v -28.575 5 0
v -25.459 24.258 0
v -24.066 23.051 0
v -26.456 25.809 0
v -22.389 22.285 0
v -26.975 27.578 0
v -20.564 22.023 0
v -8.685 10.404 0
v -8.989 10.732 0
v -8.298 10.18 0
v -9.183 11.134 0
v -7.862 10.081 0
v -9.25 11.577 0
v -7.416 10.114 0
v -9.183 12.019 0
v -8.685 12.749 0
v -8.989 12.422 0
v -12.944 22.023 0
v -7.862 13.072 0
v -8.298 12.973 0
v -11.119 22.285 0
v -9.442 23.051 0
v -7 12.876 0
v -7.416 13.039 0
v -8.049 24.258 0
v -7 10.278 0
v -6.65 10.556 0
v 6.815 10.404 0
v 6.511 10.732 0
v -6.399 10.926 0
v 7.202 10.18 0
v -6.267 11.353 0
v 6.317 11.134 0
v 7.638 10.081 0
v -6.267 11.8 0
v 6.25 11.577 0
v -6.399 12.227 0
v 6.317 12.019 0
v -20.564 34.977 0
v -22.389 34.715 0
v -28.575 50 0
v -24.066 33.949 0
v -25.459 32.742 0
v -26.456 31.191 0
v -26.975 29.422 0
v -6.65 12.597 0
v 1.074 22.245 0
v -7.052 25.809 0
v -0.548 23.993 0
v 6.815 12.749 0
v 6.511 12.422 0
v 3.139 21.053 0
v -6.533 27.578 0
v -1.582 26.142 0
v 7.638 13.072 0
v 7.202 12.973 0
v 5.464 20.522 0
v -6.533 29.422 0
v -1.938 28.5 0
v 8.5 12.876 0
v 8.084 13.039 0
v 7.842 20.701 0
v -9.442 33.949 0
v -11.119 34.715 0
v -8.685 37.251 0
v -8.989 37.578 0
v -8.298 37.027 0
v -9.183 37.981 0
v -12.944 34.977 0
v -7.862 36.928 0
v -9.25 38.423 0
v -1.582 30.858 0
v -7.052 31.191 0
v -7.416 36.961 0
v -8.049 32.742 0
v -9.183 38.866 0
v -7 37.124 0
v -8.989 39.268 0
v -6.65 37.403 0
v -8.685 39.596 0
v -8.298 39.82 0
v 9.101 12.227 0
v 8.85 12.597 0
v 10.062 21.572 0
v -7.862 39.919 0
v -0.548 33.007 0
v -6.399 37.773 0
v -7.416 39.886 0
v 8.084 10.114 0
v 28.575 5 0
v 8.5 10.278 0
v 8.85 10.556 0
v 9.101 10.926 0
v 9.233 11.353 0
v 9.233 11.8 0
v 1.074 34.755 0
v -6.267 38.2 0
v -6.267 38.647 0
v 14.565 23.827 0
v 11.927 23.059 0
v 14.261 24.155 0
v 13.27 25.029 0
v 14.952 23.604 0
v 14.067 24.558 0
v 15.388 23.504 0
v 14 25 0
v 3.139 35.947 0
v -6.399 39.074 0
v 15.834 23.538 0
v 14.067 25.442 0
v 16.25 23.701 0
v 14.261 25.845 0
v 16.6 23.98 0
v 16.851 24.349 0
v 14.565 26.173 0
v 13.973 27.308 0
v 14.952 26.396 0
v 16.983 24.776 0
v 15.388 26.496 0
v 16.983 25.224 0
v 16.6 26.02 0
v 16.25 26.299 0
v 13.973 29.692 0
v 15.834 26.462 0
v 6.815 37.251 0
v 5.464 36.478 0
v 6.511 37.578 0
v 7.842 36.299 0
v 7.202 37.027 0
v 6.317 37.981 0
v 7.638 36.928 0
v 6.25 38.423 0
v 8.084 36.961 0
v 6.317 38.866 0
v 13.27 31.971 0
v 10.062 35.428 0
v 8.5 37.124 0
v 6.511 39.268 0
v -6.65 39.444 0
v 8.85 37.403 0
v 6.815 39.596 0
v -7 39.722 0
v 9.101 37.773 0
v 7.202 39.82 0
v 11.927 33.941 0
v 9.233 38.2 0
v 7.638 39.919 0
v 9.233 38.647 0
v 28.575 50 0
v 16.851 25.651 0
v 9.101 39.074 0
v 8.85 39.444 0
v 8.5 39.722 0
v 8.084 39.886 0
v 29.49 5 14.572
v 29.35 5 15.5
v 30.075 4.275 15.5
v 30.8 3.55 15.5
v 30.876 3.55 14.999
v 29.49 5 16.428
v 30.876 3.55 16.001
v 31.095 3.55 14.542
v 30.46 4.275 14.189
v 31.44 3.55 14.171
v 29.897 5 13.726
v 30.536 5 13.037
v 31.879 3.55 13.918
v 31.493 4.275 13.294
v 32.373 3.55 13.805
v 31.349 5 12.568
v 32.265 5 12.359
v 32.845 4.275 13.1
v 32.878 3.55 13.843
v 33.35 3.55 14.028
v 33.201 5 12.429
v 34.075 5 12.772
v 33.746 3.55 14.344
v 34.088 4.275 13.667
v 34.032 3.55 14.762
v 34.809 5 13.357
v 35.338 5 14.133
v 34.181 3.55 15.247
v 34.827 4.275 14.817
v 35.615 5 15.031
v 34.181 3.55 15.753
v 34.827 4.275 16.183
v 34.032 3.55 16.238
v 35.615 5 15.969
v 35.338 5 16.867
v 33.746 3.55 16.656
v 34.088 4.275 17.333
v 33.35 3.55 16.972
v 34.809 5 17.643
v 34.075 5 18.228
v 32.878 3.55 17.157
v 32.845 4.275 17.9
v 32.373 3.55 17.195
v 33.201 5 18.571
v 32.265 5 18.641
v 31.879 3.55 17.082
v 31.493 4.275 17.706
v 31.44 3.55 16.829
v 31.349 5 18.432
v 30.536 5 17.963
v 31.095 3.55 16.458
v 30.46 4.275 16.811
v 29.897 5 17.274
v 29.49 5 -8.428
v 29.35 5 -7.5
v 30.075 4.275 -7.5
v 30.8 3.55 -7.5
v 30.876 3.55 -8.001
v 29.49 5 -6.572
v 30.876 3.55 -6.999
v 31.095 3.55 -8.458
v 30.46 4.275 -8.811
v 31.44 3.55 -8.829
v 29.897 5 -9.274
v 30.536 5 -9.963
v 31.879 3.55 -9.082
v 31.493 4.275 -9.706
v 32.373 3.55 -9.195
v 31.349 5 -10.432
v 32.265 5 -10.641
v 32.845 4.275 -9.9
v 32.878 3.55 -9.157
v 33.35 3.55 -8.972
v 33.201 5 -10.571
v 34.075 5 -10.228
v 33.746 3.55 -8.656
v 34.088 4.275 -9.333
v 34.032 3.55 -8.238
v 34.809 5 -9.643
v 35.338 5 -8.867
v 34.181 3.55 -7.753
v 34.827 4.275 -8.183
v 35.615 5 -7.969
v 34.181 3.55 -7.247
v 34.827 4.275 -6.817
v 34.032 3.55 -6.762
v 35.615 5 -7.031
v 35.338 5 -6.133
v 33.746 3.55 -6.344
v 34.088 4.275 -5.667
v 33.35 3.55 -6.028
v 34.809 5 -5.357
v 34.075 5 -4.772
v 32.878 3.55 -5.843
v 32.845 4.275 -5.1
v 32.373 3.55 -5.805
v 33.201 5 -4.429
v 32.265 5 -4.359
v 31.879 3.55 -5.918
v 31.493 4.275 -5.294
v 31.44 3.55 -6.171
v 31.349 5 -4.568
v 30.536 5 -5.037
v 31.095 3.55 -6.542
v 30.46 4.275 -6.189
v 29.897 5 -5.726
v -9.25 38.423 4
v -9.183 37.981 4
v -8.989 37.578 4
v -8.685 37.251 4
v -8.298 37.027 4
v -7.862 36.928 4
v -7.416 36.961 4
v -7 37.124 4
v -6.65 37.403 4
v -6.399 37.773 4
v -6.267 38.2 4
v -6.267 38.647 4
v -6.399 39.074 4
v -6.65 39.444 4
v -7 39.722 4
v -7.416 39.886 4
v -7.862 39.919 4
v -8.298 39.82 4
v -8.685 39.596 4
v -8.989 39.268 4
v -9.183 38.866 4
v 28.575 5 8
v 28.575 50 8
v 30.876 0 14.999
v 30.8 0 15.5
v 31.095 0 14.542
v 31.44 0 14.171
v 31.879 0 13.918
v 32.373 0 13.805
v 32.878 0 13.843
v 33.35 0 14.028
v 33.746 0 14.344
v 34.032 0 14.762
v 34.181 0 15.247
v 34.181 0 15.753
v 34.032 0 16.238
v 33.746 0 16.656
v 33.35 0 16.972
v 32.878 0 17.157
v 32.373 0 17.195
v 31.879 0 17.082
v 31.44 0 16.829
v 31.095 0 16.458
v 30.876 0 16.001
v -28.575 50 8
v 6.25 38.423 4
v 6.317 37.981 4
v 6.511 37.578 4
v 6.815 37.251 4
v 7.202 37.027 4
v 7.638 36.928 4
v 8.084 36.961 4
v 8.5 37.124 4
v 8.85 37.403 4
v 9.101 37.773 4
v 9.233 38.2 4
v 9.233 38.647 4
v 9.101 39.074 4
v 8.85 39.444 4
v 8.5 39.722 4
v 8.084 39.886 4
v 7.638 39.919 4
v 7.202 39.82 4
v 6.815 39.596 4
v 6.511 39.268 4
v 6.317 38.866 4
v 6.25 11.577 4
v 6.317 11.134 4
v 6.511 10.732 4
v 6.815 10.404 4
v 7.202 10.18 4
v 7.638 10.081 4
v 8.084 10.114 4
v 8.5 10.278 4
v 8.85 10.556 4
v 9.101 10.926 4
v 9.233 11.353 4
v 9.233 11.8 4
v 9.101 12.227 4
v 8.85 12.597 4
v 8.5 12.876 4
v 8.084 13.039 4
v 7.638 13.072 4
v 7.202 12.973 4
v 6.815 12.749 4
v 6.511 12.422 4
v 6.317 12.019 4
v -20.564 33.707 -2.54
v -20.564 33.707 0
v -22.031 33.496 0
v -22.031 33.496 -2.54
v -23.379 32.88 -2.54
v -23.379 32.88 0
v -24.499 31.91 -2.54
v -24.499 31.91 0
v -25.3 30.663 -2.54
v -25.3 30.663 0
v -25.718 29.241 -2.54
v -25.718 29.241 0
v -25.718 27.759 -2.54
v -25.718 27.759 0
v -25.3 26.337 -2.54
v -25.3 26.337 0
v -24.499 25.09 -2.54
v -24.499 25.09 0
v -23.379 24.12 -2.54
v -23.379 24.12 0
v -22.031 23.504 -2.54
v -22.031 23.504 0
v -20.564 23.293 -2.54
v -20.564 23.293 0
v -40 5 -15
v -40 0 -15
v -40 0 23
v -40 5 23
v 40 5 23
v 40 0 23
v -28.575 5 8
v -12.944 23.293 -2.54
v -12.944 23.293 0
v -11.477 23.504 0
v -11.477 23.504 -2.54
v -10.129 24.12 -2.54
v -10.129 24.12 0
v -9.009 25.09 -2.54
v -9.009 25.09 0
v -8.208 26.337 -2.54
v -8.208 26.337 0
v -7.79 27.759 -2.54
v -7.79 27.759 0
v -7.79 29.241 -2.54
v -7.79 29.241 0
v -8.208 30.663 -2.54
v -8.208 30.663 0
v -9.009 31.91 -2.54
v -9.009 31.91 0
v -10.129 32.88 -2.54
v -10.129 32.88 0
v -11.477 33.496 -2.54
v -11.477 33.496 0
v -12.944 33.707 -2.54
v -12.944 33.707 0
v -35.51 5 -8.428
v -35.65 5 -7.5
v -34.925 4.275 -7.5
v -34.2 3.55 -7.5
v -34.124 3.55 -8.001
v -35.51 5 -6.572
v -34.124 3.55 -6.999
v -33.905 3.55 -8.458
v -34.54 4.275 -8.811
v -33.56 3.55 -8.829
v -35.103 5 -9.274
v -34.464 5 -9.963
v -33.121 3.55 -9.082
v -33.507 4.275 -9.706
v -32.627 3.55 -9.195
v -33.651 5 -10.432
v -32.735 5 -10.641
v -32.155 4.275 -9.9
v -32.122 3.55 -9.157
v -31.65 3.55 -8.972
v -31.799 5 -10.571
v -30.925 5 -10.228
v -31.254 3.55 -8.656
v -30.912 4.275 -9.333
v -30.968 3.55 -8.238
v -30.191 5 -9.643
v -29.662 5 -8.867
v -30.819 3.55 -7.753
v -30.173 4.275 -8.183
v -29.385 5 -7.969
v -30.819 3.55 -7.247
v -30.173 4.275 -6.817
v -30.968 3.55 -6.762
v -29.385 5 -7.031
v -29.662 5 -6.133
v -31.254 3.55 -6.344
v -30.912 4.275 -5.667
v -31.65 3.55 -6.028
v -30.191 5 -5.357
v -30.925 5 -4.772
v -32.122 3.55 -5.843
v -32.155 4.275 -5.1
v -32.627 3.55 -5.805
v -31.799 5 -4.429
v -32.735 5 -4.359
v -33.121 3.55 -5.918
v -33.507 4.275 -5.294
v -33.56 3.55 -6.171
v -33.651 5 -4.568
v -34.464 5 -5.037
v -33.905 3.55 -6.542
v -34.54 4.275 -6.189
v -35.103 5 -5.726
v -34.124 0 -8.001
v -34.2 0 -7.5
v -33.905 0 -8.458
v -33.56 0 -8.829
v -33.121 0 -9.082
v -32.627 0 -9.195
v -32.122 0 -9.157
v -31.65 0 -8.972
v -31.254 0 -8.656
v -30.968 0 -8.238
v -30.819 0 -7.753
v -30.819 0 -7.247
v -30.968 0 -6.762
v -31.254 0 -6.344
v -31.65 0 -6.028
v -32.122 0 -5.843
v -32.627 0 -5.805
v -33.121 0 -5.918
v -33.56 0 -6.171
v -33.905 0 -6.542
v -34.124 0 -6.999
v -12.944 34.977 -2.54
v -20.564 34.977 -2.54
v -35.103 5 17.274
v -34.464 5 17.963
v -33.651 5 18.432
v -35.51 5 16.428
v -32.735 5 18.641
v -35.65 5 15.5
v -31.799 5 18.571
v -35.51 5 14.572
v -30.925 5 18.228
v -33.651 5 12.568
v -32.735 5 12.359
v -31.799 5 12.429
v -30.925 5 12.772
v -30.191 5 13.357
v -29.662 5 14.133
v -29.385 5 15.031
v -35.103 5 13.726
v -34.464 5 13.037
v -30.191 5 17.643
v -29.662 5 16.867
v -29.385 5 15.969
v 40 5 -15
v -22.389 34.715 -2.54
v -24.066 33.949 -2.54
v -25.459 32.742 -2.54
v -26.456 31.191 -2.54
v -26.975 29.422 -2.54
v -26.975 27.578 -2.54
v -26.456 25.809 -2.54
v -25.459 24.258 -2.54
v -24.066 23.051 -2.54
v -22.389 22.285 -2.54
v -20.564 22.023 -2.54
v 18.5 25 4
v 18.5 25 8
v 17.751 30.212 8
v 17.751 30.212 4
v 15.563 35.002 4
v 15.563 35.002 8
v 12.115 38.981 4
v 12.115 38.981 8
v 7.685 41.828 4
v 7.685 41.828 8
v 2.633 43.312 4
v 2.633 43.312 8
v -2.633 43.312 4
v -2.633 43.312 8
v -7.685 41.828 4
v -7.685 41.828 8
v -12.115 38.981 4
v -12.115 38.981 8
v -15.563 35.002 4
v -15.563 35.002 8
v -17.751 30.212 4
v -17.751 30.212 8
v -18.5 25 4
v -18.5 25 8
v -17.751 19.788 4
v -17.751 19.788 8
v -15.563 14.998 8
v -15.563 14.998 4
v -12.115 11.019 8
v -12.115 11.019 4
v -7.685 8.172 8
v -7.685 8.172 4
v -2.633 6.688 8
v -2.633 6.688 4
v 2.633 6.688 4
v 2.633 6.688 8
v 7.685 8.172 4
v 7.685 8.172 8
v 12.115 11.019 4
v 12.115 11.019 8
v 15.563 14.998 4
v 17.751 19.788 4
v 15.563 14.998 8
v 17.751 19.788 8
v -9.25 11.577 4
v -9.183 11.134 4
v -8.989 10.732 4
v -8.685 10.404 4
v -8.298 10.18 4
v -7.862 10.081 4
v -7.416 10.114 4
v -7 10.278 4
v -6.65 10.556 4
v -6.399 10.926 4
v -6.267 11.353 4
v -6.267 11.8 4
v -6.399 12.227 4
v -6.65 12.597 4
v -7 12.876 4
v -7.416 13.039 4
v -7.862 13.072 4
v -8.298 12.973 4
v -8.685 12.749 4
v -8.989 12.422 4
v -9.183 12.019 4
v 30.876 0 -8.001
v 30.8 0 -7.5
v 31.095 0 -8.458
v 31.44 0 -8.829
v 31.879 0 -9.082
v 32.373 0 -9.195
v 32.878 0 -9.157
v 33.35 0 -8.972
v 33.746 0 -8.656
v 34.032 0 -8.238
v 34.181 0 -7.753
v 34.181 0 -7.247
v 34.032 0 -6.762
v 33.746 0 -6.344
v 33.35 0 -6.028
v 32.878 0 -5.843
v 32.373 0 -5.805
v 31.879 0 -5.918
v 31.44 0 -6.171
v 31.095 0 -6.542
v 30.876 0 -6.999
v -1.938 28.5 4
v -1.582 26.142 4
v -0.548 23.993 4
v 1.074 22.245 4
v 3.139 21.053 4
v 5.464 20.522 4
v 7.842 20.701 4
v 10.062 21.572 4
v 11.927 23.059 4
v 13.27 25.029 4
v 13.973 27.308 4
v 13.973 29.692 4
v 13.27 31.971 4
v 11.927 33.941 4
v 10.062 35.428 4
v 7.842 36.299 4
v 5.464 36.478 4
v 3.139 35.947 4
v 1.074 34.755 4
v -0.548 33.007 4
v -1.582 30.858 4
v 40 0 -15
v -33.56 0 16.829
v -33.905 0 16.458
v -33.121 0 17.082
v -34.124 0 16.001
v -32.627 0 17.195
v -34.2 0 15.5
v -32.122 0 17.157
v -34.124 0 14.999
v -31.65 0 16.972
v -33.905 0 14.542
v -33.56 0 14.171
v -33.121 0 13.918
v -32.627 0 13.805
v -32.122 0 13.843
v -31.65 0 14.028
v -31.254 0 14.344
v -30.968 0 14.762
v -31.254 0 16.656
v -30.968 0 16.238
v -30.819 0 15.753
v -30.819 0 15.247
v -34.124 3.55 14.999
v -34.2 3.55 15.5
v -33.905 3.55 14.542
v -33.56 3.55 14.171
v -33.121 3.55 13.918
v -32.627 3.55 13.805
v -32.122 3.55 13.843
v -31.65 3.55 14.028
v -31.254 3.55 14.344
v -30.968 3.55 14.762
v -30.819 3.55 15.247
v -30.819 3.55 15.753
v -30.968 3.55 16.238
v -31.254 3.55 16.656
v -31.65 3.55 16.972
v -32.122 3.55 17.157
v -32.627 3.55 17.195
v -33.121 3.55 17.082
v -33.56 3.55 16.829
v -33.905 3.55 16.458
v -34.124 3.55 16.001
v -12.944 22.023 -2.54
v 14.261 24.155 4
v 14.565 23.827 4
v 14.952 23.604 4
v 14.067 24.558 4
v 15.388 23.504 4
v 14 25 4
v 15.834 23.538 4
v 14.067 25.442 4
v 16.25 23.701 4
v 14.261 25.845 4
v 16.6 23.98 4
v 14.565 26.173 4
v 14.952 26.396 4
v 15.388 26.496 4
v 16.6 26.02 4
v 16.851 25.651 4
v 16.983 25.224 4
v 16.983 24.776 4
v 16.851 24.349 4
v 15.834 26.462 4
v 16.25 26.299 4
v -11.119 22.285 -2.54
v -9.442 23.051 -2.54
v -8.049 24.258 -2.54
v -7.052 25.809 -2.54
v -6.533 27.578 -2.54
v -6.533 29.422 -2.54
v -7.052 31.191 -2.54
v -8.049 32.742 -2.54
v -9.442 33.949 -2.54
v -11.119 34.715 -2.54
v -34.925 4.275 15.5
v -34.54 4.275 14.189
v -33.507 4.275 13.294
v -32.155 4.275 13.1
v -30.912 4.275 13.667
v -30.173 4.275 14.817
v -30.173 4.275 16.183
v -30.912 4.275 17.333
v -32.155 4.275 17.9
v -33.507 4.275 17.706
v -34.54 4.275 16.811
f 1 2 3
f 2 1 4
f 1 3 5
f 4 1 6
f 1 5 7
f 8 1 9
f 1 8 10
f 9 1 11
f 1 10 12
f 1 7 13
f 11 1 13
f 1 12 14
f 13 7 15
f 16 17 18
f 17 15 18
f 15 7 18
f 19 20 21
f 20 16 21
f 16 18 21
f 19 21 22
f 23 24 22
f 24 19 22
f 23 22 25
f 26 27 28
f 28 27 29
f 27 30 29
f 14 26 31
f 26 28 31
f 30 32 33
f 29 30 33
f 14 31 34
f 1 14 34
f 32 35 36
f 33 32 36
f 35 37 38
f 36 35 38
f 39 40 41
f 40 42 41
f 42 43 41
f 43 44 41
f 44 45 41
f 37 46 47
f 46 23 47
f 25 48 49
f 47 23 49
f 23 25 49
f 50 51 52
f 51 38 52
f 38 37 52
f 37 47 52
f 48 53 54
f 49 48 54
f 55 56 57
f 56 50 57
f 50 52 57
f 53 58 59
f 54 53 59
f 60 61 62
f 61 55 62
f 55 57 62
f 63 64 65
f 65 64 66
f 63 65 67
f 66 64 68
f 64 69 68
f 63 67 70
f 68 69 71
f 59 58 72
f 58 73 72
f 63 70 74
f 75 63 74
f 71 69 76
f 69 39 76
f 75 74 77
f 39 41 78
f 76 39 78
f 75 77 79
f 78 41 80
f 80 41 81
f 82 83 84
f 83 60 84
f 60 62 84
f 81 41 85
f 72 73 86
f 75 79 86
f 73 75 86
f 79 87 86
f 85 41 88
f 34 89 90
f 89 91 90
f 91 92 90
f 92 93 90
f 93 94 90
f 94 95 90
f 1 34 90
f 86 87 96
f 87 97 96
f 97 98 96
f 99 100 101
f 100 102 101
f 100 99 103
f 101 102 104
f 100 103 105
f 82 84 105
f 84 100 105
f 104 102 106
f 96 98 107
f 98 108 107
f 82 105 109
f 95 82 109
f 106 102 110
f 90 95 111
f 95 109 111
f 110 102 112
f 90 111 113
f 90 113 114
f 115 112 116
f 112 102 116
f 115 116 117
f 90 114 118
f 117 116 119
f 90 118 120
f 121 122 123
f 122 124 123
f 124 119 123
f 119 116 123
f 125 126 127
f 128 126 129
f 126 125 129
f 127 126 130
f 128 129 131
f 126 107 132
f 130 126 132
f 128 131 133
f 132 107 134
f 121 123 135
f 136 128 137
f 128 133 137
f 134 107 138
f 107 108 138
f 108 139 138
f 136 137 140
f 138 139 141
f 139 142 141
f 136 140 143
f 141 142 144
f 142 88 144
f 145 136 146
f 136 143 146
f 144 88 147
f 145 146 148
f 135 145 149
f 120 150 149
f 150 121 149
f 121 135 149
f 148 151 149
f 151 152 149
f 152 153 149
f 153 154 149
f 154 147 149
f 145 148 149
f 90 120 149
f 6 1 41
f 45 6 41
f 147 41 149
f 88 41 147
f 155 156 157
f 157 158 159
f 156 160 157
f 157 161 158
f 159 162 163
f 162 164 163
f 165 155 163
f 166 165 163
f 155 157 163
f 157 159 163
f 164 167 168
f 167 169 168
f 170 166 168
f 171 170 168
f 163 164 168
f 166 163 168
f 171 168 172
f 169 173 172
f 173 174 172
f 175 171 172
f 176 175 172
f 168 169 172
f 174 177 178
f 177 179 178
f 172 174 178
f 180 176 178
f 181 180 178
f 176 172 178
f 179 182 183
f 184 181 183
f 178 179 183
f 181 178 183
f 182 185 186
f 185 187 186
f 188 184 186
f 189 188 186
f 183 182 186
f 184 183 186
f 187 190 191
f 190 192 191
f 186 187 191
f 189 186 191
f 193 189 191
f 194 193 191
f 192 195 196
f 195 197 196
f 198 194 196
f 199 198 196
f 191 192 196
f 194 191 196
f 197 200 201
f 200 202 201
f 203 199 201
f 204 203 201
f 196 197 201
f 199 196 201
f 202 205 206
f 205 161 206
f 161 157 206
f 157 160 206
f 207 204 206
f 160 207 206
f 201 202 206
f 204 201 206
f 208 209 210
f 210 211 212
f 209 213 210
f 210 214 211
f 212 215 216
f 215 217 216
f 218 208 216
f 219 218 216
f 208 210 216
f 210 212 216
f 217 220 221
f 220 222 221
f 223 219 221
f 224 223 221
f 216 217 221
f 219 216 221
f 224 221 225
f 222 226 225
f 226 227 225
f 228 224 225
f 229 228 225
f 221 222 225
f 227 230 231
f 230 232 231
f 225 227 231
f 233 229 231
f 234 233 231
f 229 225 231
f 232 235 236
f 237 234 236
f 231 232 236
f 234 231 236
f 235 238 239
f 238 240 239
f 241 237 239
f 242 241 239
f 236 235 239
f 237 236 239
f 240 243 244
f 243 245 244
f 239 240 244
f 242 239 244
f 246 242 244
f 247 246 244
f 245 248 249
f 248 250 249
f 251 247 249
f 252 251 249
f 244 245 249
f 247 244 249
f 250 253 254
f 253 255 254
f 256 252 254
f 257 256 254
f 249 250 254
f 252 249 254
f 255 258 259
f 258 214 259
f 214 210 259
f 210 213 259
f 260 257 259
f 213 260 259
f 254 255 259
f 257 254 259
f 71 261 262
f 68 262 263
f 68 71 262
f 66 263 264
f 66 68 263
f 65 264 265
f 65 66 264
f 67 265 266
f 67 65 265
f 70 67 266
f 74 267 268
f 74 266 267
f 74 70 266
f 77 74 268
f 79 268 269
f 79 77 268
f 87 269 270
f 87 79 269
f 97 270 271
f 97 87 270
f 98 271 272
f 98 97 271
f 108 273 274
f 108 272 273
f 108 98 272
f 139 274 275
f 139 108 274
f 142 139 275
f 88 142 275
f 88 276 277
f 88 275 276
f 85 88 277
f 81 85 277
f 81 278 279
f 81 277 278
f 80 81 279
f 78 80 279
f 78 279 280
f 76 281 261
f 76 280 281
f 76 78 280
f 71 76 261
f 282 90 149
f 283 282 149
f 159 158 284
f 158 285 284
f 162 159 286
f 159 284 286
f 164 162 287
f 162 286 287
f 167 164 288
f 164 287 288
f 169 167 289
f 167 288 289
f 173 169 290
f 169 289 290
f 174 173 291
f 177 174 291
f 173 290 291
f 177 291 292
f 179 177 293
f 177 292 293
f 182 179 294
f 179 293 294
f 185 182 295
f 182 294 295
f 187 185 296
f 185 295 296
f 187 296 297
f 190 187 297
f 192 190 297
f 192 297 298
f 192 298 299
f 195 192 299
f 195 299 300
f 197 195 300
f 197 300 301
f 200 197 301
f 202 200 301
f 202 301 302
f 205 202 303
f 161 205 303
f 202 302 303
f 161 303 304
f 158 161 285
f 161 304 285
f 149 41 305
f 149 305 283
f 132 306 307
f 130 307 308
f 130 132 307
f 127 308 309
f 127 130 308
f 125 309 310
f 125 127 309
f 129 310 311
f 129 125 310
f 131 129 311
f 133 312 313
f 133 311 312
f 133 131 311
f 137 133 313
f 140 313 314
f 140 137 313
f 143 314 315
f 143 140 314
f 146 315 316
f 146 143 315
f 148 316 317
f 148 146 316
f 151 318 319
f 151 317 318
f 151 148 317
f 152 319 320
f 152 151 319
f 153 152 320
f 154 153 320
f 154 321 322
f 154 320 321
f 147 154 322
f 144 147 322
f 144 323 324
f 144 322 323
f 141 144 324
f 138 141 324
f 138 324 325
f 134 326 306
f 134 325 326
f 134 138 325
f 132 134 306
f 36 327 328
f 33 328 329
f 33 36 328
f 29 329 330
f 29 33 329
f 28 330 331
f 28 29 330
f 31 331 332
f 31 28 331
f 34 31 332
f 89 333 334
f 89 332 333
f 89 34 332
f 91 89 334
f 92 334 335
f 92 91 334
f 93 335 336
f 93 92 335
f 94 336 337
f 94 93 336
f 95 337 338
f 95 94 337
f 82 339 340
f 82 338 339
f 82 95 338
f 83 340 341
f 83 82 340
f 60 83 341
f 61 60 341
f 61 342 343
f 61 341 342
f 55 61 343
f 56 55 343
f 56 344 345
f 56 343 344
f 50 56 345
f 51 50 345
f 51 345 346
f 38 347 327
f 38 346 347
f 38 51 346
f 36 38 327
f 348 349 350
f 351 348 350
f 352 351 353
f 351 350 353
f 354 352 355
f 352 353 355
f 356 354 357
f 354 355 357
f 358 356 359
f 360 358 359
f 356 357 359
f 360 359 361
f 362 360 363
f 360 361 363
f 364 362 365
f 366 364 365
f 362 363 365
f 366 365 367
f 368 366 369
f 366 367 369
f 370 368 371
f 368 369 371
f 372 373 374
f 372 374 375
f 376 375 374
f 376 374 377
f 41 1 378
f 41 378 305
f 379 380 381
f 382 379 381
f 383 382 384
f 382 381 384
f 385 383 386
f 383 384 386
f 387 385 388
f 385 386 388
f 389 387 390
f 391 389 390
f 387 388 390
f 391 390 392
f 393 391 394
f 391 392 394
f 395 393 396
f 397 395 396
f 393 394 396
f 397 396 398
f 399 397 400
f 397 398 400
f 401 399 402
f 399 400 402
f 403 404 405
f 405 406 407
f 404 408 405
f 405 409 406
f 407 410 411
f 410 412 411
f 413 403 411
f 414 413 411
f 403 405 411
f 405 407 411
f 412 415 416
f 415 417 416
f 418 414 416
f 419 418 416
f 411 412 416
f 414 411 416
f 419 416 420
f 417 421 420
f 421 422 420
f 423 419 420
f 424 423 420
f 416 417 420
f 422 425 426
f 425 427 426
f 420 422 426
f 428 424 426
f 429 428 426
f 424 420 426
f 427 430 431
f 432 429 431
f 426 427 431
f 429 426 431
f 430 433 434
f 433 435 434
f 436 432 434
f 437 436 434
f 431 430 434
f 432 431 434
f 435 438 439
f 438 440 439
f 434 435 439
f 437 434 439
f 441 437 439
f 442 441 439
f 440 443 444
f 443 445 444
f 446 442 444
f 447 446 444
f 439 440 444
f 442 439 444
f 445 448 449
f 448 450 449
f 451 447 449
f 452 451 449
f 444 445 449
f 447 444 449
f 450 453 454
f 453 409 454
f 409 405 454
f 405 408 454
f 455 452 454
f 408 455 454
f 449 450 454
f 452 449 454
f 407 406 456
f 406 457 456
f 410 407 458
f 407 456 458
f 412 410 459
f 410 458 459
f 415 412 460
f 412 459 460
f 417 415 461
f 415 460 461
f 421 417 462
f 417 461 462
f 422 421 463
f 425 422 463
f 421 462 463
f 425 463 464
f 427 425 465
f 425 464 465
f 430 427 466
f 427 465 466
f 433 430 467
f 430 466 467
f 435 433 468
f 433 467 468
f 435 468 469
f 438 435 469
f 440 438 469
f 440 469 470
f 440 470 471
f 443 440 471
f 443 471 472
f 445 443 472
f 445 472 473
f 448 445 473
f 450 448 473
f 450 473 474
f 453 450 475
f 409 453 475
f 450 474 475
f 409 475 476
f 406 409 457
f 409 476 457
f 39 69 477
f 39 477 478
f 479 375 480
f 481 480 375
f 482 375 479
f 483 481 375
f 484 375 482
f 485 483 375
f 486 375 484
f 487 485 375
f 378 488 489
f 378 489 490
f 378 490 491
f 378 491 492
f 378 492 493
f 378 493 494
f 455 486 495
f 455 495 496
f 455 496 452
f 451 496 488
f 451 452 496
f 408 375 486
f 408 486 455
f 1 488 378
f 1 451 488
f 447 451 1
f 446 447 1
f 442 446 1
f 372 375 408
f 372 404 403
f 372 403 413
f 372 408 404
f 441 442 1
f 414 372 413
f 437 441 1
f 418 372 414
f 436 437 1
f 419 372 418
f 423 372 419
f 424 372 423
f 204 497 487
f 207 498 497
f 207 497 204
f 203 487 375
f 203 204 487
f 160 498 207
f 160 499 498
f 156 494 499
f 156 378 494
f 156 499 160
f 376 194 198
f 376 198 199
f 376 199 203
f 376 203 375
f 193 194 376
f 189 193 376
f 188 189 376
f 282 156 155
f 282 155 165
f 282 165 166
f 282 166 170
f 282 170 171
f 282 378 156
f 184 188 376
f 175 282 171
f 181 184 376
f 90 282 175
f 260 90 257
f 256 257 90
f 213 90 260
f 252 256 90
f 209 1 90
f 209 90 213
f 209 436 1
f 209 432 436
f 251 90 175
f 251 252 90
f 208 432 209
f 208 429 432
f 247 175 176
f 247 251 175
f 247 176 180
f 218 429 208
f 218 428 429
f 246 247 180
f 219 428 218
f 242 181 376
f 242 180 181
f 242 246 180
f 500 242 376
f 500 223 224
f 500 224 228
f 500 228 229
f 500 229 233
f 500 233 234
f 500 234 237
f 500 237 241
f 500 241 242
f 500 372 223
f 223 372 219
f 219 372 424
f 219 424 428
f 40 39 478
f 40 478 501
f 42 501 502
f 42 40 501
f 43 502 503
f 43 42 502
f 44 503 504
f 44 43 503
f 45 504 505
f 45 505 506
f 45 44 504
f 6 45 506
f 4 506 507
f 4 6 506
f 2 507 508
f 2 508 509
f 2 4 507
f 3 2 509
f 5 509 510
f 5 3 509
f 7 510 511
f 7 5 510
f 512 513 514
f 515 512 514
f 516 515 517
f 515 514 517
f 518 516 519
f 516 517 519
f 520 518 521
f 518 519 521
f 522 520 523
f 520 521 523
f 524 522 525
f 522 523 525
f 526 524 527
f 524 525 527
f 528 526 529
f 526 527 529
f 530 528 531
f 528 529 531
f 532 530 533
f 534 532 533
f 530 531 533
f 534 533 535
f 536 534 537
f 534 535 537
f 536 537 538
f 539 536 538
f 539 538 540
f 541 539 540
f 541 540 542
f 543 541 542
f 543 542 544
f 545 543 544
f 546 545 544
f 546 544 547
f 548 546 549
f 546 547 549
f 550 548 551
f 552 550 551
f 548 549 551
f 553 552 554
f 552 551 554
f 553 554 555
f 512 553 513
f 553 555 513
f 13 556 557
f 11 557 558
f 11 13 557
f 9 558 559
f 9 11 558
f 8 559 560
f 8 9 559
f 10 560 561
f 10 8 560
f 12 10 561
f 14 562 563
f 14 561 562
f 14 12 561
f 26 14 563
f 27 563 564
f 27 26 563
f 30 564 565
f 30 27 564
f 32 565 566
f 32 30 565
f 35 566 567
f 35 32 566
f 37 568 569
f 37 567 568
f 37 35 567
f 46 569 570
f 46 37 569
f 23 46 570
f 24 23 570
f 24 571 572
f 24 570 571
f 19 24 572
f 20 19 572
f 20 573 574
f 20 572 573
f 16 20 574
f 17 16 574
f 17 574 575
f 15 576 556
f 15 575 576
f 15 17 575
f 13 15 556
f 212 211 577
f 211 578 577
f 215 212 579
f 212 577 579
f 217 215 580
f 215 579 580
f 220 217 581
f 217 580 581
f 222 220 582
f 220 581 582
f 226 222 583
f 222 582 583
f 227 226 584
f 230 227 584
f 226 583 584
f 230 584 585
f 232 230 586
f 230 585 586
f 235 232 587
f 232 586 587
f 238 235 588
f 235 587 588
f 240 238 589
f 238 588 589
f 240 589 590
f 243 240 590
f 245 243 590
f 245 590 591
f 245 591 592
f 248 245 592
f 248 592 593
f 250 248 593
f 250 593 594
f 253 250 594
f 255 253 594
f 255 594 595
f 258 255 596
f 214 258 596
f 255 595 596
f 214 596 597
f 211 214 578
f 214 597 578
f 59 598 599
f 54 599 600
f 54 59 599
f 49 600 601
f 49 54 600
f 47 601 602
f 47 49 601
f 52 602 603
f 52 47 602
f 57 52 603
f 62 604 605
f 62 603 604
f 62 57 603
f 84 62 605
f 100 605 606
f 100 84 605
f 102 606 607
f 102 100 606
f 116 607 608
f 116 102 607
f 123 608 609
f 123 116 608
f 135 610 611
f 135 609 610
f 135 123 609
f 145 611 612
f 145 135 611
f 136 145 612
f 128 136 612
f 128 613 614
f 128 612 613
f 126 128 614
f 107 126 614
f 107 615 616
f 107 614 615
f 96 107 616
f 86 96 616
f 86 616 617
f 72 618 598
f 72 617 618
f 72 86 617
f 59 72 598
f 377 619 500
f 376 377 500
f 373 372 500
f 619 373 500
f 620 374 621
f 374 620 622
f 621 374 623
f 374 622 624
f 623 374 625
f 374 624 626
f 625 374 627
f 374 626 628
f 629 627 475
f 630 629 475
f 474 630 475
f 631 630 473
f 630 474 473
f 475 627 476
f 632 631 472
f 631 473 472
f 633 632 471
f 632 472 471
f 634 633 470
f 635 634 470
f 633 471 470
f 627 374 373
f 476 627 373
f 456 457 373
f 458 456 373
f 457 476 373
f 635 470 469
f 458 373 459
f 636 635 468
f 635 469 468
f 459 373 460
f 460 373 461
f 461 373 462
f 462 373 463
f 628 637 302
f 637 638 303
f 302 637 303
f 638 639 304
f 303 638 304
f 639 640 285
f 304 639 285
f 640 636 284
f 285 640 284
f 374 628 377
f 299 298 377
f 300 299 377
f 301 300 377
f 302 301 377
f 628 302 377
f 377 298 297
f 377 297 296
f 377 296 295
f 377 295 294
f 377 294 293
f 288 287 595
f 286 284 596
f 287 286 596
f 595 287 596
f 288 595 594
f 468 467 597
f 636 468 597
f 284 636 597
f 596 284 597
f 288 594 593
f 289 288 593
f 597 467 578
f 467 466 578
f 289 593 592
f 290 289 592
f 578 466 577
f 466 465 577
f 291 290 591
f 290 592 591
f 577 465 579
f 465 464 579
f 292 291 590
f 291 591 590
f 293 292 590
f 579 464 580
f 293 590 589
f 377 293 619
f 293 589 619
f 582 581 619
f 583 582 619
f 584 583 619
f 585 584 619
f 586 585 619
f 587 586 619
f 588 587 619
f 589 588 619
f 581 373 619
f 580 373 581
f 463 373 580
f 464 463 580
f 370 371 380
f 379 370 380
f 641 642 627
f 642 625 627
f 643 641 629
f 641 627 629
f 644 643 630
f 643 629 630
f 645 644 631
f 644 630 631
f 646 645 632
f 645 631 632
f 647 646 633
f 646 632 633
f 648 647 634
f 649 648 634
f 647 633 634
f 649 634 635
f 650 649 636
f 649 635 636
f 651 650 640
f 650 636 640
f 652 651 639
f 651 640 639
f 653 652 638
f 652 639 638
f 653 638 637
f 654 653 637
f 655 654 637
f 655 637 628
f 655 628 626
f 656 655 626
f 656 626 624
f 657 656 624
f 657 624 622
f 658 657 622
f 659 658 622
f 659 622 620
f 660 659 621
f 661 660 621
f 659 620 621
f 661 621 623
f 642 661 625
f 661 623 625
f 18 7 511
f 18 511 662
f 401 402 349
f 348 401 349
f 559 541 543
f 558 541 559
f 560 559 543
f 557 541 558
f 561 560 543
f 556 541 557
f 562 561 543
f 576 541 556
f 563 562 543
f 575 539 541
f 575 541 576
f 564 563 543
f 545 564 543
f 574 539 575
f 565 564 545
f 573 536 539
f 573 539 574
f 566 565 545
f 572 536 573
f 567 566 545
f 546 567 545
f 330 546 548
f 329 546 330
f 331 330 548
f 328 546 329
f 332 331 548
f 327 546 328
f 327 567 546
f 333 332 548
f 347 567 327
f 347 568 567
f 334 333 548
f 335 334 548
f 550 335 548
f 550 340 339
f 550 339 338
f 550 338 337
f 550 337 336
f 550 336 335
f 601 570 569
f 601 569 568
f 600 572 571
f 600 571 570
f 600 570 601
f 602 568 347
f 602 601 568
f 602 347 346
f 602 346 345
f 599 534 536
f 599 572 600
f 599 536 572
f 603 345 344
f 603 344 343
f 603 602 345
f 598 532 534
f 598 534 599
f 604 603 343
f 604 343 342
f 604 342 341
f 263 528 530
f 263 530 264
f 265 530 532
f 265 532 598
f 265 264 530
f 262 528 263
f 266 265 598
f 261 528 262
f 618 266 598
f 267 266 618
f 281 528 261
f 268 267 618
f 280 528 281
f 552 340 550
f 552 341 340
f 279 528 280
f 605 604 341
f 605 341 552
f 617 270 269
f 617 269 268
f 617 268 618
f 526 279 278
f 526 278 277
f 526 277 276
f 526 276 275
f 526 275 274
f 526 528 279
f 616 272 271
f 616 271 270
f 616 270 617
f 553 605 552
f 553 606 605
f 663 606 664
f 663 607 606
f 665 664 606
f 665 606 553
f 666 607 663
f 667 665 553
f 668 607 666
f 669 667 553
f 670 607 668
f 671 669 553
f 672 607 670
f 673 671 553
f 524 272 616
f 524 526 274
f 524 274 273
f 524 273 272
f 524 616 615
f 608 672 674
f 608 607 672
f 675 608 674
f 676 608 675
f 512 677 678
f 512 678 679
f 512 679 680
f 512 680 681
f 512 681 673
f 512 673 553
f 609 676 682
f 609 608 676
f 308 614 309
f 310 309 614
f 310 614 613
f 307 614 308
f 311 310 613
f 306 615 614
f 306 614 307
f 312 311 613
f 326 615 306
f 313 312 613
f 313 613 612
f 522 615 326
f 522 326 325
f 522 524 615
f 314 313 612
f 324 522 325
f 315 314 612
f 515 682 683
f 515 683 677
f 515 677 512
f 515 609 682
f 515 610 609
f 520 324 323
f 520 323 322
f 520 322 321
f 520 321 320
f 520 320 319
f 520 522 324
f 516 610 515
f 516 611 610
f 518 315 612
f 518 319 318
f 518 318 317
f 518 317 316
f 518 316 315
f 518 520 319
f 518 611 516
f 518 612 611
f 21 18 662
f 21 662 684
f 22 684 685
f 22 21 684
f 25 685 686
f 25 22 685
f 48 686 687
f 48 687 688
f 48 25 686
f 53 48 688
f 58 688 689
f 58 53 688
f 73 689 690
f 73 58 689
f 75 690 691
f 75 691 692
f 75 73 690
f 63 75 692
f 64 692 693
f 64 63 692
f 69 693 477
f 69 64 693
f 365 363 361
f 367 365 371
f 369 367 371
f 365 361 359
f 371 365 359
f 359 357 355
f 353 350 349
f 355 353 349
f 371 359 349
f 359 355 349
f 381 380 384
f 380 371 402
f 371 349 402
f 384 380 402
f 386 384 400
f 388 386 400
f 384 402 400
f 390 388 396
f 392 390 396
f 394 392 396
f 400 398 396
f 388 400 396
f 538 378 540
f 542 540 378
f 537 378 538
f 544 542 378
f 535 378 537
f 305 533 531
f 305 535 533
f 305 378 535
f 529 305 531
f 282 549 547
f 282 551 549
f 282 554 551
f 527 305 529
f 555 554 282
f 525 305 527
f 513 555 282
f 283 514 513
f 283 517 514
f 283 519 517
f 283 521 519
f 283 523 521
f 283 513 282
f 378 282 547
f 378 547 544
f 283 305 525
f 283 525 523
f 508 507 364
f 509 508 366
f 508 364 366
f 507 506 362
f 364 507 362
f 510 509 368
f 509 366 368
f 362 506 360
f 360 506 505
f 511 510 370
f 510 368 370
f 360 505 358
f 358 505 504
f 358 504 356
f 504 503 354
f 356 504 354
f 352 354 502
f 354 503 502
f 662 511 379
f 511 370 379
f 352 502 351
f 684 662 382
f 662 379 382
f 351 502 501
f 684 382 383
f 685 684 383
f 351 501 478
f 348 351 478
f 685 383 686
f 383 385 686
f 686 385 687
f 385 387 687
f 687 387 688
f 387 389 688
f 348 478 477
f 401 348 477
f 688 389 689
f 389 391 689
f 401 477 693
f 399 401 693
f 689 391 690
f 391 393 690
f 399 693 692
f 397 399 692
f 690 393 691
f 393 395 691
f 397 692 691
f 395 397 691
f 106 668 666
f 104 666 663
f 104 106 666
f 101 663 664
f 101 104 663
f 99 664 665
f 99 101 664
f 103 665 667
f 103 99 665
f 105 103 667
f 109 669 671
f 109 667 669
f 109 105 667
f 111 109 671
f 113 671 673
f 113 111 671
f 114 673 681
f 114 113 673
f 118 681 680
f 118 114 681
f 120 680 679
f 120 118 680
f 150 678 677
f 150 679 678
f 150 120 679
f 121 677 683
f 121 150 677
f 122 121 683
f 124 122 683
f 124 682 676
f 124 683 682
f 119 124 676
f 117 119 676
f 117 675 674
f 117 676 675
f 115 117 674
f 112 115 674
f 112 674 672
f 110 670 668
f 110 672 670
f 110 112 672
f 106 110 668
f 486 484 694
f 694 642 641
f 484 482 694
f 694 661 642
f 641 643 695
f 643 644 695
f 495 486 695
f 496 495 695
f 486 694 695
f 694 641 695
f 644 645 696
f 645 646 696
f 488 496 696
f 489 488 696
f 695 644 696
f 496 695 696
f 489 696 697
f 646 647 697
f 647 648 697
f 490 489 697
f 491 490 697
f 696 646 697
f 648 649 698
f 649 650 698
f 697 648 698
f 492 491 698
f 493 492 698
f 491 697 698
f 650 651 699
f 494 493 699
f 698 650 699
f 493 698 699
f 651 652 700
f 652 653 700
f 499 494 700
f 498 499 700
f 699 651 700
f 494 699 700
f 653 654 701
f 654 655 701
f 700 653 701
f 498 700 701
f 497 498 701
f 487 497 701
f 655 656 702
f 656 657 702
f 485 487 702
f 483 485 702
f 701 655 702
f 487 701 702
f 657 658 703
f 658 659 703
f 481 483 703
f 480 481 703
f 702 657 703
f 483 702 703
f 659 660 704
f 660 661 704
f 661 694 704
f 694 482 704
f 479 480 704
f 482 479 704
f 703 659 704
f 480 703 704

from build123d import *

# Parameters (mm, degrees)
SKETCH3_W                                       = 57.15
SKETCH3_H                                       = 50
BOSS_EXTRUDE1_DEPTH                             = 8
SKETCH3_3_R                                     = 1.5
SKETCH3_3_R_2                                   = 8
CUT_EXTRUDE2_DEPTH                              = 10
SKETCH4_R                                       = 18.5
CUT_EXTRUDE3_DEPTH                              = 4
BOSS_EXTRUDE2_DEPTH                             = 15
BOSS_EXTRUDE2_DEPTH_BACK                        = 23
SKETCH6_W                                       = 80
SKETCH6_H                                       = 5
CSK_FOR_M3_FLAT_HEAD_MACHINE_SCREW1_D           = 3.4
CSK_FOR_M3_FLAT_HEAD_MACHINE_SCREW1_CSINK_D     = 6.3
CSK_FOR_M3_FLAT_HEAD_MACHINE_SCREW1_CSINK_ANGLE = 90
BOSS_EXTRUDE4_DEPTH                             = 2.54


with BuildPart() as part:
    # Sketch3 → Boss-Extrude1 (new body)
    with BuildSketch(Plane.XY):
        with Locations((0, 25)):
            Rectangle(SKETCH3_W, SKETCH3_H)
    extrude(amount=BOSS_EXTRUDE1_DEPTH)

    # Sketch3<3> → Cut-Extrude2 (cut)
    with BuildSketch(Plane.XY):
        with Locations((-7.75, 38.423393759)):
            Circle(SKETCH3_3_R)
        with Locations((7.75, 38.423393759)):
            Circle(SKETCH3_3_R)
        with Locations((-7.75, 11.576606241)):
            Circle(SKETCH3_3_R)
        with Locations((7.75, 11.576606241)):
            Circle(SKETCH3_3_R)
        with Locations((15.5, 25)):
            Circle(SKETCH3_3_R)
        with Locations((6.062177825, 28.499999999)):
            Circle(SKETCH3_3_R_2)
    extrude(amount=CUT_EXTRUDE2_DEPTH, mode=Mode.SUBTRACT)

    # Sketch4 → Cut-Extrude3 (cut)
    with BuildSketch(Plane.XY.offset(8)):
        with Locations((0, 25)):
            Circle(SKETCH4_R)
    extrude(amount=-CUT_EXTRUDE3_DEPTH, mode=Mode.SUBTRACT)

    # Sketch6 → Boss-Extrude2 (add, two sides: drawn at the far end of the back side and taken through both)
    with BuildSketch(Plane.XY.offset(8).offset(-BOSS_EXTRUDE2_DEPTH_BACK)):
        with Locations((0, 2.5)):
            Rectangle(SKETCH6_W, SKETCH6_H)
    extrude(amount=BOSS_EXTRUDE2_DEPTH + BOSS_EXTRUDE2_DEPTH_BACK)

    # CSK for M3 Flat Head Machine Screw1 (through all)
    with Locations(Plane(origin=(0, 5, 0), x_dir=(1, 0, 0), z_dir=(0, 1, 0))):
        with Locations((-32.5, 7.5), (-32.5, -15.5), (32.5, -15.5), (32.5, 7.5)):
            CounterSinkHole(CSK_FOR_M3_FLAT_HEAD_MACHINE_SCREW1_D / 2, CSK_FOR_M3_FLAT_HEAD_MACHINE_SCREW1_CSINK_D / 2, counter_sink_angle=CSK_FOR_M3_FLAT_HEAD_MACHINE_SCREW1_CSINK_ANGLE)

    # Sketch13 → Boss-Extrude4 (add)
    with BuildSketch(Plane(origin=(0, 0, 0), x_dir=(-1, 0, 0), z_dir=(0, 0, -1))):
        with BuildLine():
            Line((20.564, 22.023), (12.944, 22.023))
            ThreePointArc((12.944, 22.023), (6.467, 28.5), (12.944, 34.977))
            Line((12.944, 34.977), (20.564, 34.977))
            ThreePointArc((20.564, 34.977), (27.041, 28.5), (20.564, 22.023))
        make_face()
        with BuildLine():
            Line((20.564, 23.293), (12.944, 23.293))
            ThreePointArc((12.944, 23.293), (7.737, 28.5), (12.944, 33.707))
            Line((12.944, 33.707), (20.564, 33.707))
            ThreePointArc((20.564, 33.707), (25.771, 28.5), (20.564, 23.293))
        make_face(mode=Mode.SUBTRACT)
    extrude(amount=BOSS_EXTRUDE4_DEPTH)


solid = part.part
